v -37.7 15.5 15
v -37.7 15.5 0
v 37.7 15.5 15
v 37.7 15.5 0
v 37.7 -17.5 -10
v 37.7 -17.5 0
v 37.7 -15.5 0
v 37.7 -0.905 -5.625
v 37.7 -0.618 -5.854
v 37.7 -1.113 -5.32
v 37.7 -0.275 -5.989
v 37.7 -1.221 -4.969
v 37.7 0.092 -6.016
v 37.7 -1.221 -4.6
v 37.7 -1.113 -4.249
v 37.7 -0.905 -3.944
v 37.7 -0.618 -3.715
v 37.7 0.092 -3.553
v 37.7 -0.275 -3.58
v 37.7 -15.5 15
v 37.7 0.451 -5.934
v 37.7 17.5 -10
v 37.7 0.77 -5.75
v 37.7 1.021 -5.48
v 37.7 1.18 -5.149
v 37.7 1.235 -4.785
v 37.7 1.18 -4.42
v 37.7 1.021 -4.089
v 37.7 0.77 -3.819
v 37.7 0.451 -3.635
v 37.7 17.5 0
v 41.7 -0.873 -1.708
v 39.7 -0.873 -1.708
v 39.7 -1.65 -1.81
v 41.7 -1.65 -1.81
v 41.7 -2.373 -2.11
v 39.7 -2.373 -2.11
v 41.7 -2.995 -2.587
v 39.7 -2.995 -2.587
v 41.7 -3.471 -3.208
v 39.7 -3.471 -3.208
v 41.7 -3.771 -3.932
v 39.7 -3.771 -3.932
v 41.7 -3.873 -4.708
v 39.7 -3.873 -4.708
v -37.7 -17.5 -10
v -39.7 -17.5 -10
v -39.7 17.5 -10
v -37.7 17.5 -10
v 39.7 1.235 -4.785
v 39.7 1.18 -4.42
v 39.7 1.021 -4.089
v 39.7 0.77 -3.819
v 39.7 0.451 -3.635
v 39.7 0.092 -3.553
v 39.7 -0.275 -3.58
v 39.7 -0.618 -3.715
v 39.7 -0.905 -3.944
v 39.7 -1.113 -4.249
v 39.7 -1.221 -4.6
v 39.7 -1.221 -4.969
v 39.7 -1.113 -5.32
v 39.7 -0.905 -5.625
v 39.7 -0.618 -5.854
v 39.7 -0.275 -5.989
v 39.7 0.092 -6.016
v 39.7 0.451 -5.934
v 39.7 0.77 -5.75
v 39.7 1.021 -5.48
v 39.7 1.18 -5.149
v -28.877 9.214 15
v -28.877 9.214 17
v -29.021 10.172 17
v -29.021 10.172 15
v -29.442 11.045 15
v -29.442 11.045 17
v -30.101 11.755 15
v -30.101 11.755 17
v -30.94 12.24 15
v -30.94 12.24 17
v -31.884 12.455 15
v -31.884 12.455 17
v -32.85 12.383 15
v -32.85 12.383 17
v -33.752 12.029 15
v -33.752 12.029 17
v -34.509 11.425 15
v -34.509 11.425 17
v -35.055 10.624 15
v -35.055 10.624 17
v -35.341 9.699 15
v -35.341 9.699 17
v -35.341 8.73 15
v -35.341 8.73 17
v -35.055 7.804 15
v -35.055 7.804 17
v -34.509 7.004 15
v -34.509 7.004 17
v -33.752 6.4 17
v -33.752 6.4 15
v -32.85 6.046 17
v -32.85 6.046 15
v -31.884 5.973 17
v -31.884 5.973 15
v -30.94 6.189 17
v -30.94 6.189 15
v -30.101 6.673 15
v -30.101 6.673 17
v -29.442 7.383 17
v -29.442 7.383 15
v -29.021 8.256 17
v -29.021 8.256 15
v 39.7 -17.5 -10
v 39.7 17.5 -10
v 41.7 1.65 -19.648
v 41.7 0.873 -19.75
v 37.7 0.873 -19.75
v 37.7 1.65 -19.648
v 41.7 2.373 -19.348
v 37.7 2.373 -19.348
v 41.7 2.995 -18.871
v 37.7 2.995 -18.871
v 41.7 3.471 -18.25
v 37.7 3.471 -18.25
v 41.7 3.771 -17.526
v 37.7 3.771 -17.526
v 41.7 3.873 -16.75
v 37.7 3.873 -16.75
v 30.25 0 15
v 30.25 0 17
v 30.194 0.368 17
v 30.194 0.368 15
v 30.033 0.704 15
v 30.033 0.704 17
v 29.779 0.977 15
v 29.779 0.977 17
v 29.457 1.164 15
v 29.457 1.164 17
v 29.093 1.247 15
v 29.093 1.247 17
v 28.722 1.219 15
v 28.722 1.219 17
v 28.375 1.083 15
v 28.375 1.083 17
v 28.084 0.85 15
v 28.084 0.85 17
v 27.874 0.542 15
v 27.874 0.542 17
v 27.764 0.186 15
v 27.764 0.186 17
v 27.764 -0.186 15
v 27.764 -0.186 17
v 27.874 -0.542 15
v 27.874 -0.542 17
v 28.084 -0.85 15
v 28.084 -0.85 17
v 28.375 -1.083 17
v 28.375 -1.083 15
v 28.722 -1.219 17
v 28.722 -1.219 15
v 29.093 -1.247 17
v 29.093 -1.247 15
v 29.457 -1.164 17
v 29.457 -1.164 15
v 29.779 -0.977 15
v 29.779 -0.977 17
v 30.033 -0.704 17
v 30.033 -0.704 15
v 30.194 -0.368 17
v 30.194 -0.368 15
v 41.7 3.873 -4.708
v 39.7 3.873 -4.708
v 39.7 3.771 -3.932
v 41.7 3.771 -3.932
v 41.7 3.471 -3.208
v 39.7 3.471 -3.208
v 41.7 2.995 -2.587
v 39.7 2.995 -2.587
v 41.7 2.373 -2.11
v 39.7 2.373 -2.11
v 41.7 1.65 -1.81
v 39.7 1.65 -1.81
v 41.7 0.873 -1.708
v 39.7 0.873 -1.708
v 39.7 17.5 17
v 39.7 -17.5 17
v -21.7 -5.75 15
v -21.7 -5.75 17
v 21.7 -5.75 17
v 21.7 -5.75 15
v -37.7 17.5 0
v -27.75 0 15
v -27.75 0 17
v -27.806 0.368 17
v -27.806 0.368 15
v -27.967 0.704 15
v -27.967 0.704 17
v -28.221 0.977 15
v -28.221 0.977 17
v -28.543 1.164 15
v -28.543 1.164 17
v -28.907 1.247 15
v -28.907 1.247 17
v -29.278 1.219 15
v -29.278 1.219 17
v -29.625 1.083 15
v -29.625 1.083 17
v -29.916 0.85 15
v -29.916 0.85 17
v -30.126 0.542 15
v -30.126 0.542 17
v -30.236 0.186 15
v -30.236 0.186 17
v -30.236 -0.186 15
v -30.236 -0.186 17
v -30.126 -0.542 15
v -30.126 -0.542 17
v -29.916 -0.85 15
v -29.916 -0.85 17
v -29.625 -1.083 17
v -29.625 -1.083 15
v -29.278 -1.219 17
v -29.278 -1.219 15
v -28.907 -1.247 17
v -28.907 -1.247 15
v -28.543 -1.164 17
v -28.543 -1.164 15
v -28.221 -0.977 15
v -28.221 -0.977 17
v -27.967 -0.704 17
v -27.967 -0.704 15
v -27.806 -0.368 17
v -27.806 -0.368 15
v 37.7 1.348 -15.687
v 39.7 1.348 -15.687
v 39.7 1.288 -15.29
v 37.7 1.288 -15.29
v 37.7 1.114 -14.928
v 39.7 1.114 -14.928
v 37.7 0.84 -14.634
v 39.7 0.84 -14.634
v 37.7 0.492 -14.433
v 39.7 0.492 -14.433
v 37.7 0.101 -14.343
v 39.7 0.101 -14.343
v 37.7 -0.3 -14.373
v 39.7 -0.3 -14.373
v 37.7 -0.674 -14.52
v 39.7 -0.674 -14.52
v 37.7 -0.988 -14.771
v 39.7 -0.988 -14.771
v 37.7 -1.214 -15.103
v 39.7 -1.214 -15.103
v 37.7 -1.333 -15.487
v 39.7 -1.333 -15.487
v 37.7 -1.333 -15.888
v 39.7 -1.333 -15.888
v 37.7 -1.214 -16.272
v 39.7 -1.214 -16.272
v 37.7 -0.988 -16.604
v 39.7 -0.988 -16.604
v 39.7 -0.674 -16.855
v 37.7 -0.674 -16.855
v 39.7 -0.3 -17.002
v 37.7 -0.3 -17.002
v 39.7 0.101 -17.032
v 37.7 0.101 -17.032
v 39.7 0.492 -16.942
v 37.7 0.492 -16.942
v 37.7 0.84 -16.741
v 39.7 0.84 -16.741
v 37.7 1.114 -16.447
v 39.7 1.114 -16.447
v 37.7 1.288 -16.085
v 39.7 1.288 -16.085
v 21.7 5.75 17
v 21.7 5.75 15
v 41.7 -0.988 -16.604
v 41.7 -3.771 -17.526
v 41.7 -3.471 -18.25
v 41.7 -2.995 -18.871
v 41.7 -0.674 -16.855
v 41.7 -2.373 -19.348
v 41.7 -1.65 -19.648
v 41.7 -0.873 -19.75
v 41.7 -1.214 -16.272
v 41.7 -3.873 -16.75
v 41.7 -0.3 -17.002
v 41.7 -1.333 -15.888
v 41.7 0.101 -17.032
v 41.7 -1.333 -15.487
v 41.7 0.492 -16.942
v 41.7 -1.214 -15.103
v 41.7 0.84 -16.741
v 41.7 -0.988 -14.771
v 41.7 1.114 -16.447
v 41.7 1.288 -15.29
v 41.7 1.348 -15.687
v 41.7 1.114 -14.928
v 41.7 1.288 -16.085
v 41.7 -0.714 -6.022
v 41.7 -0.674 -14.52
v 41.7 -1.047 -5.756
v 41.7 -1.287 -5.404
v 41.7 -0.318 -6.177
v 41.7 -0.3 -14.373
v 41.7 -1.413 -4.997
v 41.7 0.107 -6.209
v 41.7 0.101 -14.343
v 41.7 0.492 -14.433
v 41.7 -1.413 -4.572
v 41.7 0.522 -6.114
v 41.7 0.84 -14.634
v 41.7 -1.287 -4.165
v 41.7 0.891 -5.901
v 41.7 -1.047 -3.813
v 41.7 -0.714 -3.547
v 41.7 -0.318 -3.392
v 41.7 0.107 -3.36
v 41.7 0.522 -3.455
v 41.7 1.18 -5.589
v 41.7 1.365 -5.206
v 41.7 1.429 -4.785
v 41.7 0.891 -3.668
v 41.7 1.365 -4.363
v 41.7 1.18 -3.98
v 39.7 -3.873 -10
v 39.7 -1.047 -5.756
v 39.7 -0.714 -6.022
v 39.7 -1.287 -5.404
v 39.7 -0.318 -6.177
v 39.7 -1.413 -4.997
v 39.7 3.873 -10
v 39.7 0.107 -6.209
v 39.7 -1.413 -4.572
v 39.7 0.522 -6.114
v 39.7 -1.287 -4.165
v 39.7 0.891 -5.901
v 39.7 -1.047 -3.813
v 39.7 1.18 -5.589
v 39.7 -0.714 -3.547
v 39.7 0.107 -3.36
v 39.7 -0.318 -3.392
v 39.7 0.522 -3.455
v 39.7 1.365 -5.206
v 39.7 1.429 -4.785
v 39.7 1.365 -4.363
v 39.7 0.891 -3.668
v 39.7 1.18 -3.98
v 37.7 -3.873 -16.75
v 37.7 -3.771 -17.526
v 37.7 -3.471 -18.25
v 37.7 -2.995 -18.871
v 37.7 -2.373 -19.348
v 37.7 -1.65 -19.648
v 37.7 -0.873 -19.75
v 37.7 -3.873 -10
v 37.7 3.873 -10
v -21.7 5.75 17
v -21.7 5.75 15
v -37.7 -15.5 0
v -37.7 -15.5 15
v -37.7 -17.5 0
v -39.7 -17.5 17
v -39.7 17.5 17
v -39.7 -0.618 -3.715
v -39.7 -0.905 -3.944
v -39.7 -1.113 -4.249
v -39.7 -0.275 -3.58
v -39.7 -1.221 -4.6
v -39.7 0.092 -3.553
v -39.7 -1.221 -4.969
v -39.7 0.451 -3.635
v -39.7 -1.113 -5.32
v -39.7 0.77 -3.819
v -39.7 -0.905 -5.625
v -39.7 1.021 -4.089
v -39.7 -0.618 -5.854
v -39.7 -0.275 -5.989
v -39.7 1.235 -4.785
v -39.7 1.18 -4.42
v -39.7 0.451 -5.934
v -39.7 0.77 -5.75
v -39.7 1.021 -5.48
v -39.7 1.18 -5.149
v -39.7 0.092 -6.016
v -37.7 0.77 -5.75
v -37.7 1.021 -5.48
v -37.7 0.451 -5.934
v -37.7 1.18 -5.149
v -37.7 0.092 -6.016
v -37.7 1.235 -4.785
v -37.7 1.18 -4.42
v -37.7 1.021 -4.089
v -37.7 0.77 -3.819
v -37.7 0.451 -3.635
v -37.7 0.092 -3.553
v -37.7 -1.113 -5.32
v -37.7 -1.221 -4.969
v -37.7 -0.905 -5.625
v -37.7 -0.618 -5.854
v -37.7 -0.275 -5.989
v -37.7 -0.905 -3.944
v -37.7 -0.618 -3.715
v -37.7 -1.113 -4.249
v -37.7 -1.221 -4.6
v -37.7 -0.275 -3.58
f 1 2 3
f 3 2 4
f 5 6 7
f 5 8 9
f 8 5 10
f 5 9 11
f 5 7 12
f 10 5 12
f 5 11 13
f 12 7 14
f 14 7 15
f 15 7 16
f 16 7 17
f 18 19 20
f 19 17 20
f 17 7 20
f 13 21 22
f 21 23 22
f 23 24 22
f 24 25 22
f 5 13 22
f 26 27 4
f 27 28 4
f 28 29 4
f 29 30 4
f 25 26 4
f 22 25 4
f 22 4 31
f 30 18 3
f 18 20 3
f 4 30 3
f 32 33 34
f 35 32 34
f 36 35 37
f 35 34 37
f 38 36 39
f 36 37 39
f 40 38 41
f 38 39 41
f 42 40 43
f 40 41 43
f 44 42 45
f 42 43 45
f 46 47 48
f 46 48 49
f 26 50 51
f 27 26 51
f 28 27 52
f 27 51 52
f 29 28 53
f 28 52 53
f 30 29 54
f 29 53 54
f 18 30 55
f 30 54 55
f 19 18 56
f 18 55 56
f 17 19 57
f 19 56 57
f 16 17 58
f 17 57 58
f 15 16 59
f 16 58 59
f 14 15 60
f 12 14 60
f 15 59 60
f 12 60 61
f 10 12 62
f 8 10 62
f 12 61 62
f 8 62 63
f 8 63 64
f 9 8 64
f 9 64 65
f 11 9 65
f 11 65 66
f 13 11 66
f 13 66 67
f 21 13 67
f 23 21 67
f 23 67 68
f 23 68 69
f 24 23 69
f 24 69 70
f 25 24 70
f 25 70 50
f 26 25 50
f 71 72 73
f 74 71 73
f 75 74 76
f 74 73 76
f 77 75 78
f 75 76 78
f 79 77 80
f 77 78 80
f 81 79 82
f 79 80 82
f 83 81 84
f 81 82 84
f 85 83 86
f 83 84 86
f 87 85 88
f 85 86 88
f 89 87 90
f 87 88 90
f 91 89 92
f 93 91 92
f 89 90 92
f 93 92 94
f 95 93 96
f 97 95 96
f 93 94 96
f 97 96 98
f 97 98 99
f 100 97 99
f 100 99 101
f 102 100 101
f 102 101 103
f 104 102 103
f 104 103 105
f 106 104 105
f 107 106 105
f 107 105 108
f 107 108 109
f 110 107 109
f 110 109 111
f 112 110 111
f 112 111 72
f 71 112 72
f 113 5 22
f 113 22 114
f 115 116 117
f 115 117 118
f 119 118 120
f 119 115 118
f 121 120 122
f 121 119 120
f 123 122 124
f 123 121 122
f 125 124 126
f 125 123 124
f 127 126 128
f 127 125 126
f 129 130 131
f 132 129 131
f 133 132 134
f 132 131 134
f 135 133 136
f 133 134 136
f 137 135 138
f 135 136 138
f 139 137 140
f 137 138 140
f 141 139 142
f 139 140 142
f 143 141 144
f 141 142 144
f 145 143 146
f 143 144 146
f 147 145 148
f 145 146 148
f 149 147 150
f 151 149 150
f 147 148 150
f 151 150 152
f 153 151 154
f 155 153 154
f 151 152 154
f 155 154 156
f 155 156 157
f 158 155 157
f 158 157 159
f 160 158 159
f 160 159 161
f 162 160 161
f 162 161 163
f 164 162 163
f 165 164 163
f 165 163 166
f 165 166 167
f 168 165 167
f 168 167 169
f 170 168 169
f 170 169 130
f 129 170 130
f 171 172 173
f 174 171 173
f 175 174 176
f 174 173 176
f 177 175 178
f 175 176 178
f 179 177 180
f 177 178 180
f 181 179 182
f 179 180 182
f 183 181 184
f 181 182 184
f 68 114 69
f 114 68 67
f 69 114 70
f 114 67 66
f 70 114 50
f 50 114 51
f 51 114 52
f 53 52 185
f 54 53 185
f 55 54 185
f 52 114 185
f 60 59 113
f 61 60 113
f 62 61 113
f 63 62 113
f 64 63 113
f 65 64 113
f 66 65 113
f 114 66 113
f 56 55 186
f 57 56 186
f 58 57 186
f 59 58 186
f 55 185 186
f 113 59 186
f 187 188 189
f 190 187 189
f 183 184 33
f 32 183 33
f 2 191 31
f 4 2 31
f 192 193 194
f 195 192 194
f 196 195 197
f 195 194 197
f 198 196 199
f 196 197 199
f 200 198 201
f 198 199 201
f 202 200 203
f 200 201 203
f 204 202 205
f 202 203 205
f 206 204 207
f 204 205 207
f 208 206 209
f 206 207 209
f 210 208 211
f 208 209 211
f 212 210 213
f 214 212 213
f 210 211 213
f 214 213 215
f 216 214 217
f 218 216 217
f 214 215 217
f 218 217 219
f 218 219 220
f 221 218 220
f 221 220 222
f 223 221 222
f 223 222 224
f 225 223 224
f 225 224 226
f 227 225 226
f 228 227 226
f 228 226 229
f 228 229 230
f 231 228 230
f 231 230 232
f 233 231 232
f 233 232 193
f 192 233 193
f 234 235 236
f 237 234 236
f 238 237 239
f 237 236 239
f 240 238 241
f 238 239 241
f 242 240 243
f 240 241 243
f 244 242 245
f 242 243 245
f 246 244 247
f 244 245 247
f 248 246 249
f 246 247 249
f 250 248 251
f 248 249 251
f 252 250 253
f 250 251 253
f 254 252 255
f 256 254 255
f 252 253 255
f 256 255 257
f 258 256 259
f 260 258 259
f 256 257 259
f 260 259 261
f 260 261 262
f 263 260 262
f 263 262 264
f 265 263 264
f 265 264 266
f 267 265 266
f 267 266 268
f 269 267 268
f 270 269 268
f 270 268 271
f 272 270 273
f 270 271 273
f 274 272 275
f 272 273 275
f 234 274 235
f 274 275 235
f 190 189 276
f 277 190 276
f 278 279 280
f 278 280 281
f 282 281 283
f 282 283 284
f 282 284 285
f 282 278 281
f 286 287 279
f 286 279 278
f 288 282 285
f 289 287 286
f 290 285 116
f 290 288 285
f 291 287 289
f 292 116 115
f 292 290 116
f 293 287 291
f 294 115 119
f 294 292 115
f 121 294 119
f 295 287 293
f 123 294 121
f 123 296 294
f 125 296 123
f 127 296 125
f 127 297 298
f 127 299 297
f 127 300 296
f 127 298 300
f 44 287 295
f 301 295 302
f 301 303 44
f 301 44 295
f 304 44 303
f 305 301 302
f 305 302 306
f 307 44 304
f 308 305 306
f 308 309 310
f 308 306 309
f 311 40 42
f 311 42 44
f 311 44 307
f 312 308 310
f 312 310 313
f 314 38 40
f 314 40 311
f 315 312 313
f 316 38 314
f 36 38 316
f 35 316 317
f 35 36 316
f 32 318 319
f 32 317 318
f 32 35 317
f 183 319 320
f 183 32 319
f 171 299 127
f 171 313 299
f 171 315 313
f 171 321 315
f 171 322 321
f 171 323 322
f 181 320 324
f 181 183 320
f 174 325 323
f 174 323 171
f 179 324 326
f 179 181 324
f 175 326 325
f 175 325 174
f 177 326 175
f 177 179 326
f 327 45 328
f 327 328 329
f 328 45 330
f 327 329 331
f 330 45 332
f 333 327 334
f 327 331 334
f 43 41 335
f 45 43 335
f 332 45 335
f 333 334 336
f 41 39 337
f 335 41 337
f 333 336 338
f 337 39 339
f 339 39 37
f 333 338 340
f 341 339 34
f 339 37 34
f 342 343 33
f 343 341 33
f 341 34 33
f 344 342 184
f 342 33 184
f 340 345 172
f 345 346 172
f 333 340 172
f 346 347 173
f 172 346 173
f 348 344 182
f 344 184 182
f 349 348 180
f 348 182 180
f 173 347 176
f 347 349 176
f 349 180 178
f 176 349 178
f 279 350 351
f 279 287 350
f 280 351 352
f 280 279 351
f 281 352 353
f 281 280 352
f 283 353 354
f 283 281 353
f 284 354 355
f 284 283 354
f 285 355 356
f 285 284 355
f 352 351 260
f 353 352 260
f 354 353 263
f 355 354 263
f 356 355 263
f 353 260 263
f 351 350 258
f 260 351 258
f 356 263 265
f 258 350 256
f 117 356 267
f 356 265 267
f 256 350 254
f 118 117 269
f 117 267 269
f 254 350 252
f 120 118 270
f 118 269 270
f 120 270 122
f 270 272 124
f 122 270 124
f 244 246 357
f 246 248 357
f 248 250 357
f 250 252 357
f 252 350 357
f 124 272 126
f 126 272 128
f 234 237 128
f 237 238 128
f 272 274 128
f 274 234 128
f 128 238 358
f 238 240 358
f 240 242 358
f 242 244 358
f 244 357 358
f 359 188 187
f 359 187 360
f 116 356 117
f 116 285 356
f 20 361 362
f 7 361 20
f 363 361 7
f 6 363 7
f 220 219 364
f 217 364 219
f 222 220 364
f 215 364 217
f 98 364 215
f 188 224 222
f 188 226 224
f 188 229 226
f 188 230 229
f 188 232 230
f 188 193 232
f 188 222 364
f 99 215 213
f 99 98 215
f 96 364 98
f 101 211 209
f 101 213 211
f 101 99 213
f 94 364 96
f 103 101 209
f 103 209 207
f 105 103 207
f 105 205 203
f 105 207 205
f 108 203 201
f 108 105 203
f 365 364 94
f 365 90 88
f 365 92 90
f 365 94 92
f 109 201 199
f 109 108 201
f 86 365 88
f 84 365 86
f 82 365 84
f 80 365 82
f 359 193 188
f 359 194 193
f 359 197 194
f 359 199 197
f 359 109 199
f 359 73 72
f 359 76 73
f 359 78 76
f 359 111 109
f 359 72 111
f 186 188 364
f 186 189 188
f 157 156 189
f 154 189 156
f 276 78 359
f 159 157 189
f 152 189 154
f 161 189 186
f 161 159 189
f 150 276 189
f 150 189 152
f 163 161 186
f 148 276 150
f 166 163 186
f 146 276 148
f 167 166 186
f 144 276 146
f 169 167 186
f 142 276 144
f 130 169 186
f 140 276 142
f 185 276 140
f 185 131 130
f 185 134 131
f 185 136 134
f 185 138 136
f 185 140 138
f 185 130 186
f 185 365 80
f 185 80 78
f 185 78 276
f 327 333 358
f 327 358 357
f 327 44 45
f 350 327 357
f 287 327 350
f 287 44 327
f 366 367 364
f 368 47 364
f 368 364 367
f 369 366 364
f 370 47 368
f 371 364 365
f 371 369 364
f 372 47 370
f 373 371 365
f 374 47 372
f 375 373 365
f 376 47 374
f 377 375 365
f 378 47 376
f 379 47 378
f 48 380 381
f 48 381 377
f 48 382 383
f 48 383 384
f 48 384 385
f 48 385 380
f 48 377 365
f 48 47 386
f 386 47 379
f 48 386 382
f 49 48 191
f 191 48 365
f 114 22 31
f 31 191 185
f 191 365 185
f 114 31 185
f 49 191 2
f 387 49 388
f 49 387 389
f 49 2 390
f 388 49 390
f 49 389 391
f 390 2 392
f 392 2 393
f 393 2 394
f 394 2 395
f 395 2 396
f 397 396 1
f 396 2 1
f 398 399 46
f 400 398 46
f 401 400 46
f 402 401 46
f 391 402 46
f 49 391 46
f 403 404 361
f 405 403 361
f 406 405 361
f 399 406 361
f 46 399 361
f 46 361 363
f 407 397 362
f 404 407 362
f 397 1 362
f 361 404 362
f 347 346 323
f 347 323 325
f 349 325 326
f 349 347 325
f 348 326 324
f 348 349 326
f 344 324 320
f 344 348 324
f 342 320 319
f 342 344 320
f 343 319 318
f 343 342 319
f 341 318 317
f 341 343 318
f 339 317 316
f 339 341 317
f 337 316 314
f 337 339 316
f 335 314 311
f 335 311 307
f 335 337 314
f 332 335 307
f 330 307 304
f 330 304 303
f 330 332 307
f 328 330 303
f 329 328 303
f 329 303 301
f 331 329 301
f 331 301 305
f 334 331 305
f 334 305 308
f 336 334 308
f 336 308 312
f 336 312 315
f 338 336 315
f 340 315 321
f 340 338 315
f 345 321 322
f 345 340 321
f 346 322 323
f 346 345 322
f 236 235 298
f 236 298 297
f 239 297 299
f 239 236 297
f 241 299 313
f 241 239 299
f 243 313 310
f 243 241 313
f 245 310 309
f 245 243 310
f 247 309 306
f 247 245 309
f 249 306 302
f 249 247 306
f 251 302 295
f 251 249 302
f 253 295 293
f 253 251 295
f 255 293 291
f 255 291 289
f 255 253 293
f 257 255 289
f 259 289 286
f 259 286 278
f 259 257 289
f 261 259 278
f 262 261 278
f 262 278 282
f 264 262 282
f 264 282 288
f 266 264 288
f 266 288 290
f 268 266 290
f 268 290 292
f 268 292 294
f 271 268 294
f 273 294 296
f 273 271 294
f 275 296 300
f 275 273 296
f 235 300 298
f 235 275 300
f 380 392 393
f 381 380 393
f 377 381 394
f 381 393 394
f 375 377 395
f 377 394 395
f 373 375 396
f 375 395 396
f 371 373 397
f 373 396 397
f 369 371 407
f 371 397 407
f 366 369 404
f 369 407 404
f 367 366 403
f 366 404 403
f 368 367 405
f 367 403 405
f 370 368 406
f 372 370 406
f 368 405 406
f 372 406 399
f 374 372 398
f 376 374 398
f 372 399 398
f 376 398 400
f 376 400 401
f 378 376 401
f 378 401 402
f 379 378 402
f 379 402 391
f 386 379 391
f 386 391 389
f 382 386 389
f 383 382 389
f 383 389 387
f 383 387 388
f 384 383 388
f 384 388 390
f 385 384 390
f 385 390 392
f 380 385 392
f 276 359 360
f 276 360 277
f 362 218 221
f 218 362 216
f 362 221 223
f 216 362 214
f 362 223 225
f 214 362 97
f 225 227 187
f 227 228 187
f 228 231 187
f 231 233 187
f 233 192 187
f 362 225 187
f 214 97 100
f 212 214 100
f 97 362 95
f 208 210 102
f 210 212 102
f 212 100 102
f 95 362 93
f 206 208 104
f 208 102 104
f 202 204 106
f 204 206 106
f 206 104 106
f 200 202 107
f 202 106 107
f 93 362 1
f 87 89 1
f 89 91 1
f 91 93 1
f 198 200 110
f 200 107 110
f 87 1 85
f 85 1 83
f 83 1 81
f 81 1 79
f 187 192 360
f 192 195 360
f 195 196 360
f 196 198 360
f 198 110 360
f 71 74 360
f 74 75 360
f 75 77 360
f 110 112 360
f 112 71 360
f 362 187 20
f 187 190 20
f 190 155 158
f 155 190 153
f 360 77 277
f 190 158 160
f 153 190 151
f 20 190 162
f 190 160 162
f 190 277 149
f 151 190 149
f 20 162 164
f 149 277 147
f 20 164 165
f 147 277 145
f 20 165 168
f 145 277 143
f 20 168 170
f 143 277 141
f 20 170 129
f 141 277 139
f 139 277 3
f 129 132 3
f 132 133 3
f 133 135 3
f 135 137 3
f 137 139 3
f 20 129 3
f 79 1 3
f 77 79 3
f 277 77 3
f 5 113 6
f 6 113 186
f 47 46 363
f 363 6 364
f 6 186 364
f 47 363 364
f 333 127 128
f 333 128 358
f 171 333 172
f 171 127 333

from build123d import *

# Parameters (mm, degrees)
F0_W      = 79.4
F0_H      = 35
F1_DEPTH  = 17
F2_T      = -2
F4_DEPTH  = 10
F6_R      = 1.2352269845
F7_DEPTH  = 79.401
F5_W      = 43.4
F5_H      = 11.5
F5_R      = 1.25
F8_DEPTH  = 25
F9_R      = 3.25
F10_DEPTH = 25
F11_R     = 1.4286021356
F11_R_2   = 1.3479290996
F12_DEPTH = 2
F13_DEPTH = 2


with BuildPart() as f1:
    # F0 (on Top) → F1 (new body)
    with BuildSketch(Plane.XY):
        Rectangle(F0_W, F0_H)
    extrude(amount=F1_DEPTH)

    # F2
    f2_openings = [f1.faces().sort_by_distance(p)[0] for p in [
        (0, 0, 0),
    ]]
    offset(amount=F2_T, openings=f2_openings)

    # F3 (on face) → F4 (join)
    with BuildSketch(Plane(origin=(0, 0, 0), x_dir=(1, 0, 0), z_dir=(0, 0, -1))):
        Polygon((37.7, 17.5), (37.7, 15.5), (37.7, -15.5), (37.7, -17.5), (39.7, -17.5), (39.7, 17.5), align=None)
        Polygon((-37.7, -15.5), (-37.7, 15.5), (-37.7, 17.5), (-39.7, 17.5), (-39.7, -17.5), (-37.7, -17.5), align=None)
    extrude(amount=F4_DEPTH)

    # F6 (on face) → F7 (cut, through all)
    with BuildSketch(Plane.YZ.offset(39.7)):
        with Locations((0, -4.7845388763)):
            Circle(F6_R)
    extrude(amount=-F7_DEPTH, mode=Mode.SUBTRACT)

    # F5 (on face) → F8 (cut)
    with BuildSketch(Plane.XY.offset(17)):
        Rectangle(F5_W, F5_H)
        with Locations((-29, 0)):
            Circle(F5_R)
        with Locations((29, 0)):
            Circle(F5_R)
    extrude(amount=-F8_DEPTH, mode=Mode.SUBTRACT)

    # F9 (on face) → F10 (cut)
    with BuildSketch(Plane.XY.offset(17)):
        with Locations((-32.1270376444, 9.2142354697)):
            Circle(F9_R)
    extrude(amount=-F10_DEPTH, mode=Mode.SUBTRACT)


with BuildPart() as f12:
    # F11 (on face) → F12 (new body)
    with BuildSketch(Plane.YZ.offset(39.7)):
        with BuildLine():
            Line((-3.8733091205, -10), (3.8733091205, -10))
            Line((3.8733091205, -10), (3.8733091205, -4.708175987))
            ThreePointArc((3.8733091205, -4.708175987), (2.9946294641, -2.5868556434), (0.8733091205, -1.708175987))
            Line((0.8733091205, -1.708175987), (-0.8733091205, -1.708175987))
            ThreePointArc((-0.8733091205, -1.708175987), (-2.9946294641, -2.5868556434), (-3.8733091205, -4.708175987))
            Line((-3.8733091205, -4.708175987), (-3.8733091205, -10))
        make_face()
        with Locations((0, -4.7845388763)):
            Circle(F11_R, mode=Mode.SUBTRACT)
        with BuildLine():
            Line((-0.8733091205, -19.7498425841), (0.8733091205, -19.7498425841))
            ThreePointArc((0.8733091205, -19.7498425841), (2.9946294641, -18.8711629277), (3.8733091205, -16.7498425841))
            Line((3.8733091205, -16.7498425841), (3.8733091205, -10))
            Line((3.8733091205, -10), (-3.8733091205, -10))
            Line((-3.8733091205, -10), (-3.8733091205, -16.7498425841))
            ThreePointArc((-3.8733091205, -16.7498425841), (-2.9946294641, -18.8711629277), (-0.8733091205, -19.7498425841))
        make_face()
        with Locations((0, -15.6874805689)):
            Circle(F11_R_2, mode=Mode.SUBTRACT)
    extrude(amount=F12_DEPTH)

    # F11 (on face) → F13 (join)
    with BuildSketch(Plane.YZ.offset(39.7)):
        with BuildLine():
            Line((-0.8733091205, -19.7498425841), (0.8733091205, -19.7498425841))
            ThreePointArc((0.8733091205, -19.7498425841), (2.9946294641, -18.8711629277), (3.8733091205, -16.7498425841))
            Line((3.8733091205, -16.7498425841), (3.8733091205, -10))
            Line((3.8733091205, -10), (-3.8733091205, -10))
            Line((-3.8733091205, -10), (-3.8733091205, -16.7498425841))
            ThreePointArc((-3.8733091205, -16.7498425841), (-2.9946294641, -18.8711629277), (-0.8733091205, -19.7498425841))
        make_face()
        with Locations((0, -15.6874805689)):
            Circle(F11_R_2, mode=Mode.SUBTRACT)
    extrude(amount=-F13_DEPTH)


solid = Compound([f1.part, f12.part])
